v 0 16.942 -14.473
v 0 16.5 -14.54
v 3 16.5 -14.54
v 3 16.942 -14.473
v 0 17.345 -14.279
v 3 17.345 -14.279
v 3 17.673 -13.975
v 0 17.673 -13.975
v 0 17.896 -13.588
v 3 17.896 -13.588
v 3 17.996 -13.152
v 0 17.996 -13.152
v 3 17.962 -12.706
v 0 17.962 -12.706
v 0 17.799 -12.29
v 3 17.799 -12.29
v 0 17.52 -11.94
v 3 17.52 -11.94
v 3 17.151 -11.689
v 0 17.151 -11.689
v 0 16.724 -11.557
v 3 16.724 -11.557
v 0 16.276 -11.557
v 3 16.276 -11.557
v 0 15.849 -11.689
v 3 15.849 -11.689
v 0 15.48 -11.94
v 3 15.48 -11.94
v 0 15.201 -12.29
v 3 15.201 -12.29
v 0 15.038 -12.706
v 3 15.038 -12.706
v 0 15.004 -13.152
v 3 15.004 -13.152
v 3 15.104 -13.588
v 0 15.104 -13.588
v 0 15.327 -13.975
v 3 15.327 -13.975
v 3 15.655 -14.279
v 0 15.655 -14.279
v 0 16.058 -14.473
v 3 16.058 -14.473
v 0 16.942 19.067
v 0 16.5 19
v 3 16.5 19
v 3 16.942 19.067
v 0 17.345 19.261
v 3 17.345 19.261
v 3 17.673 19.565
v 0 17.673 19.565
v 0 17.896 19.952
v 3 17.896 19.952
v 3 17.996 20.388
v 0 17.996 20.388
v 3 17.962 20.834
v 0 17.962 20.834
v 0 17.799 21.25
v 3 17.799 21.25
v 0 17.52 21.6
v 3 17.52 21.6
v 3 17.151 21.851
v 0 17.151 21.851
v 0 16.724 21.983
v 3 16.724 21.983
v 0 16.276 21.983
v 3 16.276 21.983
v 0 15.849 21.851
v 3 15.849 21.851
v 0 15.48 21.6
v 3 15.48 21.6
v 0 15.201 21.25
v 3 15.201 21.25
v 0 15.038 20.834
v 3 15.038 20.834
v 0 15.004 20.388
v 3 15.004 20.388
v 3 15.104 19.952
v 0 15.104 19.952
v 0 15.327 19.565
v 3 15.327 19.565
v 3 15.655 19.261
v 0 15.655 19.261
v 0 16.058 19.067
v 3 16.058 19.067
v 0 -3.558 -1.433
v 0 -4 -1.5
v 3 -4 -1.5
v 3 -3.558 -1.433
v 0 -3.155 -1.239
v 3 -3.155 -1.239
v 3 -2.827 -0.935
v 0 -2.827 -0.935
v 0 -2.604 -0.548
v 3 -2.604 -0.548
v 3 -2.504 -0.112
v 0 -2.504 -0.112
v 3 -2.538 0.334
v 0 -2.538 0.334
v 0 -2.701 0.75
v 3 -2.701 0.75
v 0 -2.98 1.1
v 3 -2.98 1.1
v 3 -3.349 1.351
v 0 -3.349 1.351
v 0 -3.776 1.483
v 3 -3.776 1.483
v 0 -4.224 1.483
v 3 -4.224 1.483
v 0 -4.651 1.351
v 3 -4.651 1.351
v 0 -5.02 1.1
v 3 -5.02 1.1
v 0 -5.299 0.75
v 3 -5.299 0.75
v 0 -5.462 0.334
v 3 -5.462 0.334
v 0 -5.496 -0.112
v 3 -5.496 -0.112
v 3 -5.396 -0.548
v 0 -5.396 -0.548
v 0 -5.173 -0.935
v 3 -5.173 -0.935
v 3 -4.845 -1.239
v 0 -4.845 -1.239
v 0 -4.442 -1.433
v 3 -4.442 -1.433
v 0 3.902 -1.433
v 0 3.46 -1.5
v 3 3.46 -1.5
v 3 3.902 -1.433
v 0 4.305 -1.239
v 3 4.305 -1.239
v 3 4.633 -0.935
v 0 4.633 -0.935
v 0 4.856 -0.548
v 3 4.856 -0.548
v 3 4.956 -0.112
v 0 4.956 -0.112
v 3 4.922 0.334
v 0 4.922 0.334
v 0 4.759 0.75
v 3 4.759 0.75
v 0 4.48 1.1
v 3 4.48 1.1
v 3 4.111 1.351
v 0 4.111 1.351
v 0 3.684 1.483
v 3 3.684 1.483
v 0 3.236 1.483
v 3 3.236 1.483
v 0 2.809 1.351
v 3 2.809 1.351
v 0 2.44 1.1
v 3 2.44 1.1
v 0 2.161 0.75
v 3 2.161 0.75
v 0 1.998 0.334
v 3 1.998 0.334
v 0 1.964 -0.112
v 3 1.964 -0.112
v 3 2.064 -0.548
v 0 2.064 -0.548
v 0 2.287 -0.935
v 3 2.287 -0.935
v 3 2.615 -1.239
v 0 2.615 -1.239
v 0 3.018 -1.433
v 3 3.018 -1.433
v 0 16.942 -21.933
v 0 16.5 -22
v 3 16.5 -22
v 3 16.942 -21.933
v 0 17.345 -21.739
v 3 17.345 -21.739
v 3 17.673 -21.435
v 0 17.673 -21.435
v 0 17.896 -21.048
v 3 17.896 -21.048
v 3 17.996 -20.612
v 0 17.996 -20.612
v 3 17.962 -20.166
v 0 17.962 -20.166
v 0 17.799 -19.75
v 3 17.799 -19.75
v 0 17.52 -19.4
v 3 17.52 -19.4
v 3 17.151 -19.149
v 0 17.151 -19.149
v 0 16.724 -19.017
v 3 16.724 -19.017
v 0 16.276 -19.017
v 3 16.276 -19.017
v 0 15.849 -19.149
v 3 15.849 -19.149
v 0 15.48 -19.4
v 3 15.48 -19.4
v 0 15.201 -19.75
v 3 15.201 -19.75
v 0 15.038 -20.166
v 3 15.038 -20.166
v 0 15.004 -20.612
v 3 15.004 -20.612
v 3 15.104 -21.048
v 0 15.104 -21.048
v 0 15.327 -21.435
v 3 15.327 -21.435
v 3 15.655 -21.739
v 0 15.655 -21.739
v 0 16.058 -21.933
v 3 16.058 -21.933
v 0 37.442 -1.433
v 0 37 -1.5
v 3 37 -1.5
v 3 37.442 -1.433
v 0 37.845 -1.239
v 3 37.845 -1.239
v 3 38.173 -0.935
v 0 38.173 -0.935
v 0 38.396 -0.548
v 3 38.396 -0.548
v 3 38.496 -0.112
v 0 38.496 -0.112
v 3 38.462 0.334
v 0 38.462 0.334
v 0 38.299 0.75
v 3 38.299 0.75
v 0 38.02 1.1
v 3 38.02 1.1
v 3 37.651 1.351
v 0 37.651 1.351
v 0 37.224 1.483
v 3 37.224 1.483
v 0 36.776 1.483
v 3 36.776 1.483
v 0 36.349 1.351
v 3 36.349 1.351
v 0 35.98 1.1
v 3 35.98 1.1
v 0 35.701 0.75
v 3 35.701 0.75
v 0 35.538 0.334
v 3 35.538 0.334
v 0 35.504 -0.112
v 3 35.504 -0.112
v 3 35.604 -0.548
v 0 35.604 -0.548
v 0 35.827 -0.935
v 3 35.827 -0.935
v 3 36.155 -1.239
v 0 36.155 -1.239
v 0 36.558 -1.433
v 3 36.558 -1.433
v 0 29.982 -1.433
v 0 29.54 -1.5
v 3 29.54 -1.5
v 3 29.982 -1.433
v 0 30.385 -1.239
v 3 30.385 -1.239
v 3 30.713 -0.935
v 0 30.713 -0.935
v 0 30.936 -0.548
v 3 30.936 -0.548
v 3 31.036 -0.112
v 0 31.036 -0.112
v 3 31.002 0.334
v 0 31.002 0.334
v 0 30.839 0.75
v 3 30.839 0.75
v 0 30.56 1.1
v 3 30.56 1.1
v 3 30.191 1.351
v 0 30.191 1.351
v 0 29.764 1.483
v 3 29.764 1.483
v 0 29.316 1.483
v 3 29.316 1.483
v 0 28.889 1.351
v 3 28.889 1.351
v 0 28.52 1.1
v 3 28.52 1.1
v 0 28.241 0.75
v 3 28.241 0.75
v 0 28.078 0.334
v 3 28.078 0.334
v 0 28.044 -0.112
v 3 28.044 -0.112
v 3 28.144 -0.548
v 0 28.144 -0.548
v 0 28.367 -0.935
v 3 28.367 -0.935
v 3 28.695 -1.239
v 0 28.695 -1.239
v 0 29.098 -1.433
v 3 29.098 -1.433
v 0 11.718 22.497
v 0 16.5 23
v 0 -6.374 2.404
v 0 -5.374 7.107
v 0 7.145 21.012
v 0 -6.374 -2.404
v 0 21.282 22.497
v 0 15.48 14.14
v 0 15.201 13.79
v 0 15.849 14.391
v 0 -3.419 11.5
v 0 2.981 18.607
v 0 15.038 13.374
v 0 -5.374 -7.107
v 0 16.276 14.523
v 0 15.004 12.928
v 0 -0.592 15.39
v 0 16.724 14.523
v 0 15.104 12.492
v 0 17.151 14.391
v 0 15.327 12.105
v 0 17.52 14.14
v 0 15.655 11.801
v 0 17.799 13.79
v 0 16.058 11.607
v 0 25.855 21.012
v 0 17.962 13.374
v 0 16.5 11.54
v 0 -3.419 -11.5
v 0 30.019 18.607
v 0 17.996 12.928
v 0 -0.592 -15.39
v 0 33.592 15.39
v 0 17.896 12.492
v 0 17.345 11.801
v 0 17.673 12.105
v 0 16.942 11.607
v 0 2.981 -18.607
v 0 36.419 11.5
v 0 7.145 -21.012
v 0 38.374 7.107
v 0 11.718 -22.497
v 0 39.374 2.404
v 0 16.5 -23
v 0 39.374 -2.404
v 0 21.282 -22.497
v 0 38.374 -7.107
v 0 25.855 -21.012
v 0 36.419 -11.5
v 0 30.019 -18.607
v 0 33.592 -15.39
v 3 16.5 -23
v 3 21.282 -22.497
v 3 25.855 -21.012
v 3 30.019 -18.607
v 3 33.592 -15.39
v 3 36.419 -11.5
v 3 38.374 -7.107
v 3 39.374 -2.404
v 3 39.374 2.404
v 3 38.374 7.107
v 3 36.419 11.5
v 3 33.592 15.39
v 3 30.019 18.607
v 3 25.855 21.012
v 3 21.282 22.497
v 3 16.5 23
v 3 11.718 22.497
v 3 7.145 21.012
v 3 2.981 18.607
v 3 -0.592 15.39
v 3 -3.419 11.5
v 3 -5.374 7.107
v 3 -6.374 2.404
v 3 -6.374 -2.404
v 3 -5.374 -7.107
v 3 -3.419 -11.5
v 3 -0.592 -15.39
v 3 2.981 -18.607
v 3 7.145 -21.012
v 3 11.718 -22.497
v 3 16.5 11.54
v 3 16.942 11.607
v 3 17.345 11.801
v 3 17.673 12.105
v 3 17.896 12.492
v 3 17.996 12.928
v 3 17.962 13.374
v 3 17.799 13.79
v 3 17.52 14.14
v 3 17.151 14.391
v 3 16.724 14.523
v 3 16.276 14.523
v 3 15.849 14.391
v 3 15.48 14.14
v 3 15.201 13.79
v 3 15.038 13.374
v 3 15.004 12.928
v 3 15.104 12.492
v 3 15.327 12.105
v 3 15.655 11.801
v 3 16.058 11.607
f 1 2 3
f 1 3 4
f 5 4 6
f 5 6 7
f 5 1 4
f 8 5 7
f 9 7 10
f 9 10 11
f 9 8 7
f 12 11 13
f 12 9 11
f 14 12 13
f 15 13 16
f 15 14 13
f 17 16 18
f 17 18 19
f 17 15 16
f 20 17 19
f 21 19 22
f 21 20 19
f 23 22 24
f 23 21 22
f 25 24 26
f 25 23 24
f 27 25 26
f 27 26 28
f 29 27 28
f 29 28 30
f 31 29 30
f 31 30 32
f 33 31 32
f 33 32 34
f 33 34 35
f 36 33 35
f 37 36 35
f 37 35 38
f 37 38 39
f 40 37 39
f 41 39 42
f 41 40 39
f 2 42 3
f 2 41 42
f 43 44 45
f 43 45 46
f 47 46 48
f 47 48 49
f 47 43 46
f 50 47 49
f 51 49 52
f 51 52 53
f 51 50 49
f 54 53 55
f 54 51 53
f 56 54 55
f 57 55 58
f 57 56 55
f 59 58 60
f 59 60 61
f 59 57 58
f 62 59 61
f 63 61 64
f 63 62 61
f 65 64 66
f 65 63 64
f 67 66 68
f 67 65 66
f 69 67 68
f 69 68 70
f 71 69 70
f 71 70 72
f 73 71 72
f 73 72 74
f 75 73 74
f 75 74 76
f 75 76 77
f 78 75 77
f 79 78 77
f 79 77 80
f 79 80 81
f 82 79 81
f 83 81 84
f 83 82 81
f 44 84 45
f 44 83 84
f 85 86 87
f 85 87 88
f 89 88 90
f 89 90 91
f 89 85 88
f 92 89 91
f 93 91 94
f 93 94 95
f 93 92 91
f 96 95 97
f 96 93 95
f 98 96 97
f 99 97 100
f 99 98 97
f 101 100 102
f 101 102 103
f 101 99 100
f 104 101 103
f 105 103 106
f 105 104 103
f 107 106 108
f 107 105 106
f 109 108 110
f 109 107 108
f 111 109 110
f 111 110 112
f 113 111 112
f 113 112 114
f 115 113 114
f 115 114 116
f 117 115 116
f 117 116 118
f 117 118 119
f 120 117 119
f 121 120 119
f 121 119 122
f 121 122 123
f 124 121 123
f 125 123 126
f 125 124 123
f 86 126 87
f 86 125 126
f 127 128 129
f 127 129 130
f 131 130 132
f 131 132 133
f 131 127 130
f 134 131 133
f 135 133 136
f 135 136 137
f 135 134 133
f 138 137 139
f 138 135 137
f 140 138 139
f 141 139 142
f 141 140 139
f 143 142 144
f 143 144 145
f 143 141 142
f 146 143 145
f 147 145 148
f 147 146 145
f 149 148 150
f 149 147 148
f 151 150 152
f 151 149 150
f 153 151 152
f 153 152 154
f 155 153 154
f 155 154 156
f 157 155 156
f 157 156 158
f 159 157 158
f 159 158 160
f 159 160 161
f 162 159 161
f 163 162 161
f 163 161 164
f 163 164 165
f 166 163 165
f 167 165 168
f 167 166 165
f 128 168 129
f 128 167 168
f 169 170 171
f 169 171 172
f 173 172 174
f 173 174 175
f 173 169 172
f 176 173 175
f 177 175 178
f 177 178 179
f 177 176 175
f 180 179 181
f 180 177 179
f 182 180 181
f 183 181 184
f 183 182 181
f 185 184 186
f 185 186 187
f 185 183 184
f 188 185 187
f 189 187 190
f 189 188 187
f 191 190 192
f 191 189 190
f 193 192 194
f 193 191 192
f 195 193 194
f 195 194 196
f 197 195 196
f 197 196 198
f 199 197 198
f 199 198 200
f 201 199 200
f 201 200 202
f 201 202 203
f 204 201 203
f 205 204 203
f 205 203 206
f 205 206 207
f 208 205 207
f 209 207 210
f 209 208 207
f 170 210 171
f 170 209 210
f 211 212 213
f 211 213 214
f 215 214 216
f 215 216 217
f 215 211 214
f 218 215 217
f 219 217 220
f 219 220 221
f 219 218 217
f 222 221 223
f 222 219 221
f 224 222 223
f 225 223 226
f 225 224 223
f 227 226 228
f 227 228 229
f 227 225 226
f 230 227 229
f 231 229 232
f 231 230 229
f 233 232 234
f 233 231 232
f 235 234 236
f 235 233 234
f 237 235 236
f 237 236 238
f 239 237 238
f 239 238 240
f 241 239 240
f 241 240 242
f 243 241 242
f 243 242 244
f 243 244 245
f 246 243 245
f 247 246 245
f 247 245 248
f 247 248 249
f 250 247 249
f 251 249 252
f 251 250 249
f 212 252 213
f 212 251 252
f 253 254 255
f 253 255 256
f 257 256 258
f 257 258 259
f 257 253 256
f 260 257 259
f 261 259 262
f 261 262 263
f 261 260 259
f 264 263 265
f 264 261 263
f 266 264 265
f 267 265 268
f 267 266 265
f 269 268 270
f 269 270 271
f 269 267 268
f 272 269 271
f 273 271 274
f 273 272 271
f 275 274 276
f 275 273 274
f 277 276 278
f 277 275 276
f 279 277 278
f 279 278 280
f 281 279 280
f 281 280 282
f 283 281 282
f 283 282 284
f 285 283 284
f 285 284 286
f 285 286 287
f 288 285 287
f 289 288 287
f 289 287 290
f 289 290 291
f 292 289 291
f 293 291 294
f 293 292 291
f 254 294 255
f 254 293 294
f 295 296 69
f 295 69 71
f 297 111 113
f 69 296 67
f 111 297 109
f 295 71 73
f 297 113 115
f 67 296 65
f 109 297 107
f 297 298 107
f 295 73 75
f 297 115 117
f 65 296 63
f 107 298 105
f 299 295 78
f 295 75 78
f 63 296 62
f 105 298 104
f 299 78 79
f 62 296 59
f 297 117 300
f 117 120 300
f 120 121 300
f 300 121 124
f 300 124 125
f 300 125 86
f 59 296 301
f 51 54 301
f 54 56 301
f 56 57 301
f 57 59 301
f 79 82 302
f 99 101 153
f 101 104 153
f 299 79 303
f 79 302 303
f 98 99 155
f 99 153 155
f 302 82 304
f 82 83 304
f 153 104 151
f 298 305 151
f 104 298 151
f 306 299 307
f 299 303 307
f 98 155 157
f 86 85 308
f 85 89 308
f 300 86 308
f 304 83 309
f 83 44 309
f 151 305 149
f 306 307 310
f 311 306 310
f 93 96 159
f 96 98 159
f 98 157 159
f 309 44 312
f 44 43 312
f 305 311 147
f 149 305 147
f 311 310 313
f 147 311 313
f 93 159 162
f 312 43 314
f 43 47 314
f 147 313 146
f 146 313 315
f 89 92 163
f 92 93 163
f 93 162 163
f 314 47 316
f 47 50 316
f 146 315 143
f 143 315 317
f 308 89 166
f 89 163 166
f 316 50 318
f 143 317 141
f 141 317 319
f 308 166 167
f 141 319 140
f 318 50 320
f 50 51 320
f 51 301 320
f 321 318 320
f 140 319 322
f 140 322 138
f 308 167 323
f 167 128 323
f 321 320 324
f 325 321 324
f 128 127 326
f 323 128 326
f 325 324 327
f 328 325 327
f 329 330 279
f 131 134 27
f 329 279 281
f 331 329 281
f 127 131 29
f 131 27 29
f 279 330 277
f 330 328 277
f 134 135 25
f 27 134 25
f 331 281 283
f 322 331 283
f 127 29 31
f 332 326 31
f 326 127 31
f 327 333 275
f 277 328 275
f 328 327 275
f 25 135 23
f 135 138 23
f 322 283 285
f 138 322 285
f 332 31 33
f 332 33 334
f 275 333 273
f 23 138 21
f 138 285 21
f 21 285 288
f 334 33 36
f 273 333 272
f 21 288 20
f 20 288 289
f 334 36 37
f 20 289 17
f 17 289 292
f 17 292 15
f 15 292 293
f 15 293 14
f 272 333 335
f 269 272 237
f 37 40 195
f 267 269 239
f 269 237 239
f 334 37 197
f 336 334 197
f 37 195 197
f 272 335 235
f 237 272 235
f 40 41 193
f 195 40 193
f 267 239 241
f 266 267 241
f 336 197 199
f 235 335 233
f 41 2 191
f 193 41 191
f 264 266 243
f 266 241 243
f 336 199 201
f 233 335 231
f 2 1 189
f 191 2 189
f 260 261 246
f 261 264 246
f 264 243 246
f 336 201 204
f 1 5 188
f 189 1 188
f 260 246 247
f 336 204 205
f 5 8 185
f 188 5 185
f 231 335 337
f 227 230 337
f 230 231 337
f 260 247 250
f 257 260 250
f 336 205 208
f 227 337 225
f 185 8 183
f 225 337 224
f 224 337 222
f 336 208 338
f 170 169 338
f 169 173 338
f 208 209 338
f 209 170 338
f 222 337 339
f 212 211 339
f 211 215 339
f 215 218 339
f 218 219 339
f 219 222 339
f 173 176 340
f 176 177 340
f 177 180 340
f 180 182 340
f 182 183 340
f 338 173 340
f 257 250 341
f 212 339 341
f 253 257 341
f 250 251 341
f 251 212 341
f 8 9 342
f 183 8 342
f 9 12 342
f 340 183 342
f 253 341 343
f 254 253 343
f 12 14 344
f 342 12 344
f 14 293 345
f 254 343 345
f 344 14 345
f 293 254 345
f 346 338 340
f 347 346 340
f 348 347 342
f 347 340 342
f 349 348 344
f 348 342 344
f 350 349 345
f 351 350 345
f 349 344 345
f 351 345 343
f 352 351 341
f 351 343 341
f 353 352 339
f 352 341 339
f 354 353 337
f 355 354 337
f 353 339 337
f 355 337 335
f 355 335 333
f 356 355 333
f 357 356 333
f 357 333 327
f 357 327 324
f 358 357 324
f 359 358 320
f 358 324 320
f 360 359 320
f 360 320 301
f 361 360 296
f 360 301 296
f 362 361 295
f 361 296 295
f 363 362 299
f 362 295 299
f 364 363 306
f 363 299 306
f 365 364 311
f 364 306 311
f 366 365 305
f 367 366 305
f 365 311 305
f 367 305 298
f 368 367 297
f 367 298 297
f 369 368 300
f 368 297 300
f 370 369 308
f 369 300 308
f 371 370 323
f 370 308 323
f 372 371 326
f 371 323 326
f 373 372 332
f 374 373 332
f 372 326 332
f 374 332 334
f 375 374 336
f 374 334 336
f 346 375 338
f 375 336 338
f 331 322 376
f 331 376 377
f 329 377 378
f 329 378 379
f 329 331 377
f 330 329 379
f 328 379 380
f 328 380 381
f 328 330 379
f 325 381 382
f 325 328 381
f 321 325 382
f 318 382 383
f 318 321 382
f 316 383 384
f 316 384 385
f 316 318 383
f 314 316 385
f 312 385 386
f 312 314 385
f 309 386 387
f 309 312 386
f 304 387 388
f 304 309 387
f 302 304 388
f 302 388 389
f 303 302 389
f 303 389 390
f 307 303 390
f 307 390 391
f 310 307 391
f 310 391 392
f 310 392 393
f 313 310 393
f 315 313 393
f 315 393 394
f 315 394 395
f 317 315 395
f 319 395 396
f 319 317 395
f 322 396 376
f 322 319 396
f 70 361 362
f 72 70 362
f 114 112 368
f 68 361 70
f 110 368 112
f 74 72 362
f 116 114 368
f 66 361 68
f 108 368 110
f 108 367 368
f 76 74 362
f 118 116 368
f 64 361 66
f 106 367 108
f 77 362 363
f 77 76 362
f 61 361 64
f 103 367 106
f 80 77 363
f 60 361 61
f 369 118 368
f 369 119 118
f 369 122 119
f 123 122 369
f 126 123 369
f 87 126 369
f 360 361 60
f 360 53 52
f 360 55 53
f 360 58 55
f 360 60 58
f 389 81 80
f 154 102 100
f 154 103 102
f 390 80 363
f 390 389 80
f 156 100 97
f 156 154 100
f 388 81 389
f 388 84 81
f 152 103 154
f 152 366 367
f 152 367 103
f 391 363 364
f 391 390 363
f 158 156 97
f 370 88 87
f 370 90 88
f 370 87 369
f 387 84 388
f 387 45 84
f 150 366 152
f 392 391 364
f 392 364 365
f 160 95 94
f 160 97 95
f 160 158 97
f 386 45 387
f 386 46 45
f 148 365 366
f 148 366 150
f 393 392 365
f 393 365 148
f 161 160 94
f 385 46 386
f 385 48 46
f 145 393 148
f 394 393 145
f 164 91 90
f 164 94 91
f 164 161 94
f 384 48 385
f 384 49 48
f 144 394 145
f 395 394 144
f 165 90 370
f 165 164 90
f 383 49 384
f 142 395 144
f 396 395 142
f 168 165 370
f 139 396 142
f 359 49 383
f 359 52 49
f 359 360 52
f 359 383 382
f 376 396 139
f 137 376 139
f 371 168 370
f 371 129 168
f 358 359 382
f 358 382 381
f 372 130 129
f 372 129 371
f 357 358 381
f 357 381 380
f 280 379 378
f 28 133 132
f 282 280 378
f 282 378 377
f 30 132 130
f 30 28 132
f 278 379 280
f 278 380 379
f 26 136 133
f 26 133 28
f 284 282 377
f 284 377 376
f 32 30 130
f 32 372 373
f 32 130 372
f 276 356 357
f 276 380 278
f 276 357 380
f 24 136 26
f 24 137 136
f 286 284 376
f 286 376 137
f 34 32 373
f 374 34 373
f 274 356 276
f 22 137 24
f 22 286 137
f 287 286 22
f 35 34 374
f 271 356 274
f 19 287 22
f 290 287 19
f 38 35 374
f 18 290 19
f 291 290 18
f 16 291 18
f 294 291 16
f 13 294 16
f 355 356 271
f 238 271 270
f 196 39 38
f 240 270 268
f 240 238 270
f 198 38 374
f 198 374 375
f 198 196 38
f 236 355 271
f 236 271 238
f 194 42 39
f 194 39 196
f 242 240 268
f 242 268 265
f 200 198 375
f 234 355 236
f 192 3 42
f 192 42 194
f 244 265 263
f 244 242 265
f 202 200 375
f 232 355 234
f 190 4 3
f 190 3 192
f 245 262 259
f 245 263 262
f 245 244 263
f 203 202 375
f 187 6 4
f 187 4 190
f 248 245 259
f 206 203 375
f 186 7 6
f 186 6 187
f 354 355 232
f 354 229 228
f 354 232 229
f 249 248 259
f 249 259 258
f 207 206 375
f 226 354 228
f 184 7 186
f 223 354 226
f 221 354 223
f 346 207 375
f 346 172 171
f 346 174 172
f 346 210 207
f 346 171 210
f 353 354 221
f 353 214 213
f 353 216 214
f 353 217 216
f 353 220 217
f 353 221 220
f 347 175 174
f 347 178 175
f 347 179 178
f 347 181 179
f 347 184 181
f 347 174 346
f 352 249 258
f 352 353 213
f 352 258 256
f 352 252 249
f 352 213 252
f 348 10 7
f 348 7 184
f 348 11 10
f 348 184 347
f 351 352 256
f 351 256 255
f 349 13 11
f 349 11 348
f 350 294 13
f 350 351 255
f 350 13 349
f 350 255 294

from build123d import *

# Parameters (mm, degrees)
SKETCH1_R           = 23
SKETCH1_R_2         = 1.5
BOSS_EXTRUDE1_DEPTH = 3


with BuildPart() as part:
    # Sketch1 → Boss-Extrude1 (new body)
    with BuildSketch(Plane(origin=(0, 0, 0), x_dir=(0, 0, -1), z_dir=(1, 0, 0))):
        with Locations((0, 16.5)):
            Circle(SKETCH1_R)
        with Locations((0, -4)):
            Circle(SKETCH1_R_2, mode=Mode.SUBTRACT)
        with Locations((0, 3.46)):
            Circle(SKETCH1_R_2, mode=Mode.SUBTRACT)
        with Locations((-13.04, 16.5)):
            Circle(SKETCH1_R_2, mode=Mode.SUBTRACT)
        with Locations((-20.5, 16.5)):
            Circle(SKETCH1_R_2, mode=Mode.SUBTRACT)
        with Locations((0, 29.54)):
            Circle(SKETCH1_R_2, mode=Mode.SUBTRACT)
        with Locations((0, 37)):
            Circle(SKETCH1_R_2, mode=Mode.SUBTRACT)
        with Locations((13.04, 16.5)):
            Circle(SKETCH1_R_2, mode=Mode.SUBTRACT)
        with Locations((20.5, 16.5)):
            Circle(SKETCH1_R_2, mode=Mode.SUBTRACT)
    extrude(amount=BOSS_EXTRUDE1_DEPTH)


solid = part.part
